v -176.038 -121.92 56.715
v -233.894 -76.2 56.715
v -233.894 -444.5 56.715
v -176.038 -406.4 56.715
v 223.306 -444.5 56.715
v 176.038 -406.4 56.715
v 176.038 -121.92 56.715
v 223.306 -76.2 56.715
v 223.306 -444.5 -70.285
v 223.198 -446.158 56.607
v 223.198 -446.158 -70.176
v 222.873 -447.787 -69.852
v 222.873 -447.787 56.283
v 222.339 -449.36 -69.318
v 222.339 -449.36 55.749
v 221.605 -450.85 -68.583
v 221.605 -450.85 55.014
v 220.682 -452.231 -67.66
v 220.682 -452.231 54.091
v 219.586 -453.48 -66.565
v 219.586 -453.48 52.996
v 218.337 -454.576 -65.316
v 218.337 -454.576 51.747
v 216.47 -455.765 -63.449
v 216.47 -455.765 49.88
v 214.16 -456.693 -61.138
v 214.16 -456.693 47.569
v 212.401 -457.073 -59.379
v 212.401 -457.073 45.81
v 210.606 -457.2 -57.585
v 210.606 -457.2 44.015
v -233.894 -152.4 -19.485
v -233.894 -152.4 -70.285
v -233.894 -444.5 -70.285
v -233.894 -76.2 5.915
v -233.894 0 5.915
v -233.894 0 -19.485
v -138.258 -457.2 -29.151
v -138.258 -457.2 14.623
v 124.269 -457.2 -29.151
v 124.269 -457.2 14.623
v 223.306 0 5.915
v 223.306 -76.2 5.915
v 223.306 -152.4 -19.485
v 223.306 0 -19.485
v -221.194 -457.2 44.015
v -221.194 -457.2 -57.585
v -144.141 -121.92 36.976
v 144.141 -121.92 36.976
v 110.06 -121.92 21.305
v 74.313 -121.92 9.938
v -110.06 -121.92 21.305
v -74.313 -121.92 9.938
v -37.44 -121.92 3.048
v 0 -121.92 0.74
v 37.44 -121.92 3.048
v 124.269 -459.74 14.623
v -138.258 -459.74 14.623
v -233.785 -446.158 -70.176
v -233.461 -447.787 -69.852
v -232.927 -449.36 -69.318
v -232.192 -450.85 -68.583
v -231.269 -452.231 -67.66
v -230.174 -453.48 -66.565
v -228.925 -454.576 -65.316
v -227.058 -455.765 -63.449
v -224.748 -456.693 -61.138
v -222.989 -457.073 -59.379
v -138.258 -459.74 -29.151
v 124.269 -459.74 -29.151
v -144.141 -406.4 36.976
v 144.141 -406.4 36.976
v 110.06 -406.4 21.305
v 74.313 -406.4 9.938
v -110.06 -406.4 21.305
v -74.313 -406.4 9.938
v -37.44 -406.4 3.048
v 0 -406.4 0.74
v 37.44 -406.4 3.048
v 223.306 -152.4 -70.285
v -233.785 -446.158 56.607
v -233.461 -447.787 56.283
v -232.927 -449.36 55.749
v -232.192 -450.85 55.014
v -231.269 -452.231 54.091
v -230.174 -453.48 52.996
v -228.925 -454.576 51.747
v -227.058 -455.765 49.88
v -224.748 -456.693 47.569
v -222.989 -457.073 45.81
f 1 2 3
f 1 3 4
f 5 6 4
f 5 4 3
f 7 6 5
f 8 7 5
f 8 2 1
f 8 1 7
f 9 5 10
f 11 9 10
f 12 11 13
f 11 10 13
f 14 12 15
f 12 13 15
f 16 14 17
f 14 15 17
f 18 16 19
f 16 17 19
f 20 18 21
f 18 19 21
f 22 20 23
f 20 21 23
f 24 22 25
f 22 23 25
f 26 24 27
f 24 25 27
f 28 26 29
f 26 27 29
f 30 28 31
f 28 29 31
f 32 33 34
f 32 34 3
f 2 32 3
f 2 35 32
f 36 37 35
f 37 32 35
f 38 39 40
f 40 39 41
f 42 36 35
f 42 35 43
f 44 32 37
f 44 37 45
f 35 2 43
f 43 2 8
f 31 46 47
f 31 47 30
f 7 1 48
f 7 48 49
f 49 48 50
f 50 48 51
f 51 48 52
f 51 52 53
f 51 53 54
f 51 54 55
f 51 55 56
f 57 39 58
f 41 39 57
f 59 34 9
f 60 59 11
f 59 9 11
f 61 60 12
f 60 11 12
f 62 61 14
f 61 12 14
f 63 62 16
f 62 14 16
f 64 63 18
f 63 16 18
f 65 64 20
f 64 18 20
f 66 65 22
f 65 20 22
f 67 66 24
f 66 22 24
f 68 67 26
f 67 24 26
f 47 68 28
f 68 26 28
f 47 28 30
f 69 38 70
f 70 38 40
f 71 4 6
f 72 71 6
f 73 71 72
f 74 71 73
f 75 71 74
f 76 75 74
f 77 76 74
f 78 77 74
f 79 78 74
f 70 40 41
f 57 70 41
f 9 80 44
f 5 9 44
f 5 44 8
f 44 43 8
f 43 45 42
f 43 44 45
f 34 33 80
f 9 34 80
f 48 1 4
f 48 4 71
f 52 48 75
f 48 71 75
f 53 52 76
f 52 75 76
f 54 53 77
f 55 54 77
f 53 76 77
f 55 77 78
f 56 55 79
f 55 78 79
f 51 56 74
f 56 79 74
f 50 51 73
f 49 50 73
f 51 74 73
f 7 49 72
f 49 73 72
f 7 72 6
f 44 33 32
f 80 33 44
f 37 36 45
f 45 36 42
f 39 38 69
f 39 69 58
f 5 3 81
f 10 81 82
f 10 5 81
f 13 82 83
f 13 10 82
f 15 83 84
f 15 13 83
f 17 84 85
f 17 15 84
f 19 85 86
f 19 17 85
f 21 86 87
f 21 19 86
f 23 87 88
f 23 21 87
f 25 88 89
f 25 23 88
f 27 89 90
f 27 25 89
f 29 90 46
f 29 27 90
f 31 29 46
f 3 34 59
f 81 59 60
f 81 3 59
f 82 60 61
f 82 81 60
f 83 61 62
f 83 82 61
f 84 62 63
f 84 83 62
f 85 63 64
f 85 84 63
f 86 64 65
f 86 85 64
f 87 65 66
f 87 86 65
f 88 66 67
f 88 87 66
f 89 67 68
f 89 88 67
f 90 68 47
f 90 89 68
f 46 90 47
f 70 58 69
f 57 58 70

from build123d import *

# Parameters (mm, degrees)
F0_W      = 457.2
F0_H      = 127
F1_DEPTH  = 457.2
F2_R      = 12.7
F3_W      = 457.2
F3_H      = 76.2
F4_DEPTH  = 50.8
F6_START  = -50.8
F6_DEPTH  = 284.48
F7_W      = 262.5275105238
F7_H      = 43.7741912901
F8_DEPTH  = 2.54
F9_W      = 457.2
F9_H      = 152.4
F10_DEPTH = 50.8


with BuildPart() as f1:
    # F0 (on Front) → F1 (new body)
    with BuildSketch(Plane.XZ):
        with Locations((-5.2937921137, -6.7845043319)):
            Rectangle(F0_W, F0_H)
    extrude(amount=F1_DEPTH)

    # F2
    f2_edges = [f1.edges().sort_by_distance(p)[0] for p in [
        (-5.293792, -457.2, 56.715496),
        (-233.893792, -457.2, -6.784504),
        (-5.293792, -457.2, -70.284504),
        (223.306208, -457.2, -6.784504),
    ]]
    fillet(f2_edges, radius=F2_R)

    # F3 (on face) → F4 (cut)
    with BuildSketch(Plane.XY.offset(56.7154956681)):
        with Locations((-5.2937921137, -38.1)):
            Rectangle(F3_W, F3_H)
    extrude(amount=-F4_DEPTH, mode=Mode.SUBTRACT)

    # F5 (on face) → F6 (cut)
    with BuildSketch(Plane.XZ.offset(457.2).offset(F6_START)):
        with BuildLine():
            ThreePointArc((156.5500356786, 44.0154956681), (265.1598488411, 155.2294544651), (304.8, 305.5401146412))
            ThreePointArc((304.8, 305.5401146412), (-150.3106601761, 570.6999634823), (-156.5500356786, 44.0154956681))
            Line((-156.5500356786, 44.0154956681), (156.5500356786, 44.0154956681))
        make_face()
        with BuildLine():
            Line((156.5500356786, 44.0154956681), (-156.5500356786, 44.0154956681))
            ThreePointArc((-156.5500356786, 44.0154956681), (0, 0.7401146412), (156.5500356786, 44.0154956681))
        make_face()
    extrude(amount=-F6_DEPTH, mode=Mode.SUBTRACT)

    # F9 (on face) → F10 (cut)
    with BuildSketch(Plane(origin=(0, 0, -70.2845043319), x_dir=(1, 0, 0), z_dir=(0, 0, -1))):
        with Locations((-5.2937921137, 76.2)):
            Rectangle(F9_W, F9_H)
    extrude(amount=-F10_DEPTH, mode=Mode.SUBTRACT)


with BuildPart() as f8:
    # F7 (on face) → F8 (new body)
    with BuildSketch(Plane.XZ.offset(457.2)):
        with Locations((-6.9943666458, -7.2637684643)):
            Rectangle(F7_W, F7_H)
    extrude(amount=F8_DEPTH)


solid = Compound([f1.part, f8.part])
